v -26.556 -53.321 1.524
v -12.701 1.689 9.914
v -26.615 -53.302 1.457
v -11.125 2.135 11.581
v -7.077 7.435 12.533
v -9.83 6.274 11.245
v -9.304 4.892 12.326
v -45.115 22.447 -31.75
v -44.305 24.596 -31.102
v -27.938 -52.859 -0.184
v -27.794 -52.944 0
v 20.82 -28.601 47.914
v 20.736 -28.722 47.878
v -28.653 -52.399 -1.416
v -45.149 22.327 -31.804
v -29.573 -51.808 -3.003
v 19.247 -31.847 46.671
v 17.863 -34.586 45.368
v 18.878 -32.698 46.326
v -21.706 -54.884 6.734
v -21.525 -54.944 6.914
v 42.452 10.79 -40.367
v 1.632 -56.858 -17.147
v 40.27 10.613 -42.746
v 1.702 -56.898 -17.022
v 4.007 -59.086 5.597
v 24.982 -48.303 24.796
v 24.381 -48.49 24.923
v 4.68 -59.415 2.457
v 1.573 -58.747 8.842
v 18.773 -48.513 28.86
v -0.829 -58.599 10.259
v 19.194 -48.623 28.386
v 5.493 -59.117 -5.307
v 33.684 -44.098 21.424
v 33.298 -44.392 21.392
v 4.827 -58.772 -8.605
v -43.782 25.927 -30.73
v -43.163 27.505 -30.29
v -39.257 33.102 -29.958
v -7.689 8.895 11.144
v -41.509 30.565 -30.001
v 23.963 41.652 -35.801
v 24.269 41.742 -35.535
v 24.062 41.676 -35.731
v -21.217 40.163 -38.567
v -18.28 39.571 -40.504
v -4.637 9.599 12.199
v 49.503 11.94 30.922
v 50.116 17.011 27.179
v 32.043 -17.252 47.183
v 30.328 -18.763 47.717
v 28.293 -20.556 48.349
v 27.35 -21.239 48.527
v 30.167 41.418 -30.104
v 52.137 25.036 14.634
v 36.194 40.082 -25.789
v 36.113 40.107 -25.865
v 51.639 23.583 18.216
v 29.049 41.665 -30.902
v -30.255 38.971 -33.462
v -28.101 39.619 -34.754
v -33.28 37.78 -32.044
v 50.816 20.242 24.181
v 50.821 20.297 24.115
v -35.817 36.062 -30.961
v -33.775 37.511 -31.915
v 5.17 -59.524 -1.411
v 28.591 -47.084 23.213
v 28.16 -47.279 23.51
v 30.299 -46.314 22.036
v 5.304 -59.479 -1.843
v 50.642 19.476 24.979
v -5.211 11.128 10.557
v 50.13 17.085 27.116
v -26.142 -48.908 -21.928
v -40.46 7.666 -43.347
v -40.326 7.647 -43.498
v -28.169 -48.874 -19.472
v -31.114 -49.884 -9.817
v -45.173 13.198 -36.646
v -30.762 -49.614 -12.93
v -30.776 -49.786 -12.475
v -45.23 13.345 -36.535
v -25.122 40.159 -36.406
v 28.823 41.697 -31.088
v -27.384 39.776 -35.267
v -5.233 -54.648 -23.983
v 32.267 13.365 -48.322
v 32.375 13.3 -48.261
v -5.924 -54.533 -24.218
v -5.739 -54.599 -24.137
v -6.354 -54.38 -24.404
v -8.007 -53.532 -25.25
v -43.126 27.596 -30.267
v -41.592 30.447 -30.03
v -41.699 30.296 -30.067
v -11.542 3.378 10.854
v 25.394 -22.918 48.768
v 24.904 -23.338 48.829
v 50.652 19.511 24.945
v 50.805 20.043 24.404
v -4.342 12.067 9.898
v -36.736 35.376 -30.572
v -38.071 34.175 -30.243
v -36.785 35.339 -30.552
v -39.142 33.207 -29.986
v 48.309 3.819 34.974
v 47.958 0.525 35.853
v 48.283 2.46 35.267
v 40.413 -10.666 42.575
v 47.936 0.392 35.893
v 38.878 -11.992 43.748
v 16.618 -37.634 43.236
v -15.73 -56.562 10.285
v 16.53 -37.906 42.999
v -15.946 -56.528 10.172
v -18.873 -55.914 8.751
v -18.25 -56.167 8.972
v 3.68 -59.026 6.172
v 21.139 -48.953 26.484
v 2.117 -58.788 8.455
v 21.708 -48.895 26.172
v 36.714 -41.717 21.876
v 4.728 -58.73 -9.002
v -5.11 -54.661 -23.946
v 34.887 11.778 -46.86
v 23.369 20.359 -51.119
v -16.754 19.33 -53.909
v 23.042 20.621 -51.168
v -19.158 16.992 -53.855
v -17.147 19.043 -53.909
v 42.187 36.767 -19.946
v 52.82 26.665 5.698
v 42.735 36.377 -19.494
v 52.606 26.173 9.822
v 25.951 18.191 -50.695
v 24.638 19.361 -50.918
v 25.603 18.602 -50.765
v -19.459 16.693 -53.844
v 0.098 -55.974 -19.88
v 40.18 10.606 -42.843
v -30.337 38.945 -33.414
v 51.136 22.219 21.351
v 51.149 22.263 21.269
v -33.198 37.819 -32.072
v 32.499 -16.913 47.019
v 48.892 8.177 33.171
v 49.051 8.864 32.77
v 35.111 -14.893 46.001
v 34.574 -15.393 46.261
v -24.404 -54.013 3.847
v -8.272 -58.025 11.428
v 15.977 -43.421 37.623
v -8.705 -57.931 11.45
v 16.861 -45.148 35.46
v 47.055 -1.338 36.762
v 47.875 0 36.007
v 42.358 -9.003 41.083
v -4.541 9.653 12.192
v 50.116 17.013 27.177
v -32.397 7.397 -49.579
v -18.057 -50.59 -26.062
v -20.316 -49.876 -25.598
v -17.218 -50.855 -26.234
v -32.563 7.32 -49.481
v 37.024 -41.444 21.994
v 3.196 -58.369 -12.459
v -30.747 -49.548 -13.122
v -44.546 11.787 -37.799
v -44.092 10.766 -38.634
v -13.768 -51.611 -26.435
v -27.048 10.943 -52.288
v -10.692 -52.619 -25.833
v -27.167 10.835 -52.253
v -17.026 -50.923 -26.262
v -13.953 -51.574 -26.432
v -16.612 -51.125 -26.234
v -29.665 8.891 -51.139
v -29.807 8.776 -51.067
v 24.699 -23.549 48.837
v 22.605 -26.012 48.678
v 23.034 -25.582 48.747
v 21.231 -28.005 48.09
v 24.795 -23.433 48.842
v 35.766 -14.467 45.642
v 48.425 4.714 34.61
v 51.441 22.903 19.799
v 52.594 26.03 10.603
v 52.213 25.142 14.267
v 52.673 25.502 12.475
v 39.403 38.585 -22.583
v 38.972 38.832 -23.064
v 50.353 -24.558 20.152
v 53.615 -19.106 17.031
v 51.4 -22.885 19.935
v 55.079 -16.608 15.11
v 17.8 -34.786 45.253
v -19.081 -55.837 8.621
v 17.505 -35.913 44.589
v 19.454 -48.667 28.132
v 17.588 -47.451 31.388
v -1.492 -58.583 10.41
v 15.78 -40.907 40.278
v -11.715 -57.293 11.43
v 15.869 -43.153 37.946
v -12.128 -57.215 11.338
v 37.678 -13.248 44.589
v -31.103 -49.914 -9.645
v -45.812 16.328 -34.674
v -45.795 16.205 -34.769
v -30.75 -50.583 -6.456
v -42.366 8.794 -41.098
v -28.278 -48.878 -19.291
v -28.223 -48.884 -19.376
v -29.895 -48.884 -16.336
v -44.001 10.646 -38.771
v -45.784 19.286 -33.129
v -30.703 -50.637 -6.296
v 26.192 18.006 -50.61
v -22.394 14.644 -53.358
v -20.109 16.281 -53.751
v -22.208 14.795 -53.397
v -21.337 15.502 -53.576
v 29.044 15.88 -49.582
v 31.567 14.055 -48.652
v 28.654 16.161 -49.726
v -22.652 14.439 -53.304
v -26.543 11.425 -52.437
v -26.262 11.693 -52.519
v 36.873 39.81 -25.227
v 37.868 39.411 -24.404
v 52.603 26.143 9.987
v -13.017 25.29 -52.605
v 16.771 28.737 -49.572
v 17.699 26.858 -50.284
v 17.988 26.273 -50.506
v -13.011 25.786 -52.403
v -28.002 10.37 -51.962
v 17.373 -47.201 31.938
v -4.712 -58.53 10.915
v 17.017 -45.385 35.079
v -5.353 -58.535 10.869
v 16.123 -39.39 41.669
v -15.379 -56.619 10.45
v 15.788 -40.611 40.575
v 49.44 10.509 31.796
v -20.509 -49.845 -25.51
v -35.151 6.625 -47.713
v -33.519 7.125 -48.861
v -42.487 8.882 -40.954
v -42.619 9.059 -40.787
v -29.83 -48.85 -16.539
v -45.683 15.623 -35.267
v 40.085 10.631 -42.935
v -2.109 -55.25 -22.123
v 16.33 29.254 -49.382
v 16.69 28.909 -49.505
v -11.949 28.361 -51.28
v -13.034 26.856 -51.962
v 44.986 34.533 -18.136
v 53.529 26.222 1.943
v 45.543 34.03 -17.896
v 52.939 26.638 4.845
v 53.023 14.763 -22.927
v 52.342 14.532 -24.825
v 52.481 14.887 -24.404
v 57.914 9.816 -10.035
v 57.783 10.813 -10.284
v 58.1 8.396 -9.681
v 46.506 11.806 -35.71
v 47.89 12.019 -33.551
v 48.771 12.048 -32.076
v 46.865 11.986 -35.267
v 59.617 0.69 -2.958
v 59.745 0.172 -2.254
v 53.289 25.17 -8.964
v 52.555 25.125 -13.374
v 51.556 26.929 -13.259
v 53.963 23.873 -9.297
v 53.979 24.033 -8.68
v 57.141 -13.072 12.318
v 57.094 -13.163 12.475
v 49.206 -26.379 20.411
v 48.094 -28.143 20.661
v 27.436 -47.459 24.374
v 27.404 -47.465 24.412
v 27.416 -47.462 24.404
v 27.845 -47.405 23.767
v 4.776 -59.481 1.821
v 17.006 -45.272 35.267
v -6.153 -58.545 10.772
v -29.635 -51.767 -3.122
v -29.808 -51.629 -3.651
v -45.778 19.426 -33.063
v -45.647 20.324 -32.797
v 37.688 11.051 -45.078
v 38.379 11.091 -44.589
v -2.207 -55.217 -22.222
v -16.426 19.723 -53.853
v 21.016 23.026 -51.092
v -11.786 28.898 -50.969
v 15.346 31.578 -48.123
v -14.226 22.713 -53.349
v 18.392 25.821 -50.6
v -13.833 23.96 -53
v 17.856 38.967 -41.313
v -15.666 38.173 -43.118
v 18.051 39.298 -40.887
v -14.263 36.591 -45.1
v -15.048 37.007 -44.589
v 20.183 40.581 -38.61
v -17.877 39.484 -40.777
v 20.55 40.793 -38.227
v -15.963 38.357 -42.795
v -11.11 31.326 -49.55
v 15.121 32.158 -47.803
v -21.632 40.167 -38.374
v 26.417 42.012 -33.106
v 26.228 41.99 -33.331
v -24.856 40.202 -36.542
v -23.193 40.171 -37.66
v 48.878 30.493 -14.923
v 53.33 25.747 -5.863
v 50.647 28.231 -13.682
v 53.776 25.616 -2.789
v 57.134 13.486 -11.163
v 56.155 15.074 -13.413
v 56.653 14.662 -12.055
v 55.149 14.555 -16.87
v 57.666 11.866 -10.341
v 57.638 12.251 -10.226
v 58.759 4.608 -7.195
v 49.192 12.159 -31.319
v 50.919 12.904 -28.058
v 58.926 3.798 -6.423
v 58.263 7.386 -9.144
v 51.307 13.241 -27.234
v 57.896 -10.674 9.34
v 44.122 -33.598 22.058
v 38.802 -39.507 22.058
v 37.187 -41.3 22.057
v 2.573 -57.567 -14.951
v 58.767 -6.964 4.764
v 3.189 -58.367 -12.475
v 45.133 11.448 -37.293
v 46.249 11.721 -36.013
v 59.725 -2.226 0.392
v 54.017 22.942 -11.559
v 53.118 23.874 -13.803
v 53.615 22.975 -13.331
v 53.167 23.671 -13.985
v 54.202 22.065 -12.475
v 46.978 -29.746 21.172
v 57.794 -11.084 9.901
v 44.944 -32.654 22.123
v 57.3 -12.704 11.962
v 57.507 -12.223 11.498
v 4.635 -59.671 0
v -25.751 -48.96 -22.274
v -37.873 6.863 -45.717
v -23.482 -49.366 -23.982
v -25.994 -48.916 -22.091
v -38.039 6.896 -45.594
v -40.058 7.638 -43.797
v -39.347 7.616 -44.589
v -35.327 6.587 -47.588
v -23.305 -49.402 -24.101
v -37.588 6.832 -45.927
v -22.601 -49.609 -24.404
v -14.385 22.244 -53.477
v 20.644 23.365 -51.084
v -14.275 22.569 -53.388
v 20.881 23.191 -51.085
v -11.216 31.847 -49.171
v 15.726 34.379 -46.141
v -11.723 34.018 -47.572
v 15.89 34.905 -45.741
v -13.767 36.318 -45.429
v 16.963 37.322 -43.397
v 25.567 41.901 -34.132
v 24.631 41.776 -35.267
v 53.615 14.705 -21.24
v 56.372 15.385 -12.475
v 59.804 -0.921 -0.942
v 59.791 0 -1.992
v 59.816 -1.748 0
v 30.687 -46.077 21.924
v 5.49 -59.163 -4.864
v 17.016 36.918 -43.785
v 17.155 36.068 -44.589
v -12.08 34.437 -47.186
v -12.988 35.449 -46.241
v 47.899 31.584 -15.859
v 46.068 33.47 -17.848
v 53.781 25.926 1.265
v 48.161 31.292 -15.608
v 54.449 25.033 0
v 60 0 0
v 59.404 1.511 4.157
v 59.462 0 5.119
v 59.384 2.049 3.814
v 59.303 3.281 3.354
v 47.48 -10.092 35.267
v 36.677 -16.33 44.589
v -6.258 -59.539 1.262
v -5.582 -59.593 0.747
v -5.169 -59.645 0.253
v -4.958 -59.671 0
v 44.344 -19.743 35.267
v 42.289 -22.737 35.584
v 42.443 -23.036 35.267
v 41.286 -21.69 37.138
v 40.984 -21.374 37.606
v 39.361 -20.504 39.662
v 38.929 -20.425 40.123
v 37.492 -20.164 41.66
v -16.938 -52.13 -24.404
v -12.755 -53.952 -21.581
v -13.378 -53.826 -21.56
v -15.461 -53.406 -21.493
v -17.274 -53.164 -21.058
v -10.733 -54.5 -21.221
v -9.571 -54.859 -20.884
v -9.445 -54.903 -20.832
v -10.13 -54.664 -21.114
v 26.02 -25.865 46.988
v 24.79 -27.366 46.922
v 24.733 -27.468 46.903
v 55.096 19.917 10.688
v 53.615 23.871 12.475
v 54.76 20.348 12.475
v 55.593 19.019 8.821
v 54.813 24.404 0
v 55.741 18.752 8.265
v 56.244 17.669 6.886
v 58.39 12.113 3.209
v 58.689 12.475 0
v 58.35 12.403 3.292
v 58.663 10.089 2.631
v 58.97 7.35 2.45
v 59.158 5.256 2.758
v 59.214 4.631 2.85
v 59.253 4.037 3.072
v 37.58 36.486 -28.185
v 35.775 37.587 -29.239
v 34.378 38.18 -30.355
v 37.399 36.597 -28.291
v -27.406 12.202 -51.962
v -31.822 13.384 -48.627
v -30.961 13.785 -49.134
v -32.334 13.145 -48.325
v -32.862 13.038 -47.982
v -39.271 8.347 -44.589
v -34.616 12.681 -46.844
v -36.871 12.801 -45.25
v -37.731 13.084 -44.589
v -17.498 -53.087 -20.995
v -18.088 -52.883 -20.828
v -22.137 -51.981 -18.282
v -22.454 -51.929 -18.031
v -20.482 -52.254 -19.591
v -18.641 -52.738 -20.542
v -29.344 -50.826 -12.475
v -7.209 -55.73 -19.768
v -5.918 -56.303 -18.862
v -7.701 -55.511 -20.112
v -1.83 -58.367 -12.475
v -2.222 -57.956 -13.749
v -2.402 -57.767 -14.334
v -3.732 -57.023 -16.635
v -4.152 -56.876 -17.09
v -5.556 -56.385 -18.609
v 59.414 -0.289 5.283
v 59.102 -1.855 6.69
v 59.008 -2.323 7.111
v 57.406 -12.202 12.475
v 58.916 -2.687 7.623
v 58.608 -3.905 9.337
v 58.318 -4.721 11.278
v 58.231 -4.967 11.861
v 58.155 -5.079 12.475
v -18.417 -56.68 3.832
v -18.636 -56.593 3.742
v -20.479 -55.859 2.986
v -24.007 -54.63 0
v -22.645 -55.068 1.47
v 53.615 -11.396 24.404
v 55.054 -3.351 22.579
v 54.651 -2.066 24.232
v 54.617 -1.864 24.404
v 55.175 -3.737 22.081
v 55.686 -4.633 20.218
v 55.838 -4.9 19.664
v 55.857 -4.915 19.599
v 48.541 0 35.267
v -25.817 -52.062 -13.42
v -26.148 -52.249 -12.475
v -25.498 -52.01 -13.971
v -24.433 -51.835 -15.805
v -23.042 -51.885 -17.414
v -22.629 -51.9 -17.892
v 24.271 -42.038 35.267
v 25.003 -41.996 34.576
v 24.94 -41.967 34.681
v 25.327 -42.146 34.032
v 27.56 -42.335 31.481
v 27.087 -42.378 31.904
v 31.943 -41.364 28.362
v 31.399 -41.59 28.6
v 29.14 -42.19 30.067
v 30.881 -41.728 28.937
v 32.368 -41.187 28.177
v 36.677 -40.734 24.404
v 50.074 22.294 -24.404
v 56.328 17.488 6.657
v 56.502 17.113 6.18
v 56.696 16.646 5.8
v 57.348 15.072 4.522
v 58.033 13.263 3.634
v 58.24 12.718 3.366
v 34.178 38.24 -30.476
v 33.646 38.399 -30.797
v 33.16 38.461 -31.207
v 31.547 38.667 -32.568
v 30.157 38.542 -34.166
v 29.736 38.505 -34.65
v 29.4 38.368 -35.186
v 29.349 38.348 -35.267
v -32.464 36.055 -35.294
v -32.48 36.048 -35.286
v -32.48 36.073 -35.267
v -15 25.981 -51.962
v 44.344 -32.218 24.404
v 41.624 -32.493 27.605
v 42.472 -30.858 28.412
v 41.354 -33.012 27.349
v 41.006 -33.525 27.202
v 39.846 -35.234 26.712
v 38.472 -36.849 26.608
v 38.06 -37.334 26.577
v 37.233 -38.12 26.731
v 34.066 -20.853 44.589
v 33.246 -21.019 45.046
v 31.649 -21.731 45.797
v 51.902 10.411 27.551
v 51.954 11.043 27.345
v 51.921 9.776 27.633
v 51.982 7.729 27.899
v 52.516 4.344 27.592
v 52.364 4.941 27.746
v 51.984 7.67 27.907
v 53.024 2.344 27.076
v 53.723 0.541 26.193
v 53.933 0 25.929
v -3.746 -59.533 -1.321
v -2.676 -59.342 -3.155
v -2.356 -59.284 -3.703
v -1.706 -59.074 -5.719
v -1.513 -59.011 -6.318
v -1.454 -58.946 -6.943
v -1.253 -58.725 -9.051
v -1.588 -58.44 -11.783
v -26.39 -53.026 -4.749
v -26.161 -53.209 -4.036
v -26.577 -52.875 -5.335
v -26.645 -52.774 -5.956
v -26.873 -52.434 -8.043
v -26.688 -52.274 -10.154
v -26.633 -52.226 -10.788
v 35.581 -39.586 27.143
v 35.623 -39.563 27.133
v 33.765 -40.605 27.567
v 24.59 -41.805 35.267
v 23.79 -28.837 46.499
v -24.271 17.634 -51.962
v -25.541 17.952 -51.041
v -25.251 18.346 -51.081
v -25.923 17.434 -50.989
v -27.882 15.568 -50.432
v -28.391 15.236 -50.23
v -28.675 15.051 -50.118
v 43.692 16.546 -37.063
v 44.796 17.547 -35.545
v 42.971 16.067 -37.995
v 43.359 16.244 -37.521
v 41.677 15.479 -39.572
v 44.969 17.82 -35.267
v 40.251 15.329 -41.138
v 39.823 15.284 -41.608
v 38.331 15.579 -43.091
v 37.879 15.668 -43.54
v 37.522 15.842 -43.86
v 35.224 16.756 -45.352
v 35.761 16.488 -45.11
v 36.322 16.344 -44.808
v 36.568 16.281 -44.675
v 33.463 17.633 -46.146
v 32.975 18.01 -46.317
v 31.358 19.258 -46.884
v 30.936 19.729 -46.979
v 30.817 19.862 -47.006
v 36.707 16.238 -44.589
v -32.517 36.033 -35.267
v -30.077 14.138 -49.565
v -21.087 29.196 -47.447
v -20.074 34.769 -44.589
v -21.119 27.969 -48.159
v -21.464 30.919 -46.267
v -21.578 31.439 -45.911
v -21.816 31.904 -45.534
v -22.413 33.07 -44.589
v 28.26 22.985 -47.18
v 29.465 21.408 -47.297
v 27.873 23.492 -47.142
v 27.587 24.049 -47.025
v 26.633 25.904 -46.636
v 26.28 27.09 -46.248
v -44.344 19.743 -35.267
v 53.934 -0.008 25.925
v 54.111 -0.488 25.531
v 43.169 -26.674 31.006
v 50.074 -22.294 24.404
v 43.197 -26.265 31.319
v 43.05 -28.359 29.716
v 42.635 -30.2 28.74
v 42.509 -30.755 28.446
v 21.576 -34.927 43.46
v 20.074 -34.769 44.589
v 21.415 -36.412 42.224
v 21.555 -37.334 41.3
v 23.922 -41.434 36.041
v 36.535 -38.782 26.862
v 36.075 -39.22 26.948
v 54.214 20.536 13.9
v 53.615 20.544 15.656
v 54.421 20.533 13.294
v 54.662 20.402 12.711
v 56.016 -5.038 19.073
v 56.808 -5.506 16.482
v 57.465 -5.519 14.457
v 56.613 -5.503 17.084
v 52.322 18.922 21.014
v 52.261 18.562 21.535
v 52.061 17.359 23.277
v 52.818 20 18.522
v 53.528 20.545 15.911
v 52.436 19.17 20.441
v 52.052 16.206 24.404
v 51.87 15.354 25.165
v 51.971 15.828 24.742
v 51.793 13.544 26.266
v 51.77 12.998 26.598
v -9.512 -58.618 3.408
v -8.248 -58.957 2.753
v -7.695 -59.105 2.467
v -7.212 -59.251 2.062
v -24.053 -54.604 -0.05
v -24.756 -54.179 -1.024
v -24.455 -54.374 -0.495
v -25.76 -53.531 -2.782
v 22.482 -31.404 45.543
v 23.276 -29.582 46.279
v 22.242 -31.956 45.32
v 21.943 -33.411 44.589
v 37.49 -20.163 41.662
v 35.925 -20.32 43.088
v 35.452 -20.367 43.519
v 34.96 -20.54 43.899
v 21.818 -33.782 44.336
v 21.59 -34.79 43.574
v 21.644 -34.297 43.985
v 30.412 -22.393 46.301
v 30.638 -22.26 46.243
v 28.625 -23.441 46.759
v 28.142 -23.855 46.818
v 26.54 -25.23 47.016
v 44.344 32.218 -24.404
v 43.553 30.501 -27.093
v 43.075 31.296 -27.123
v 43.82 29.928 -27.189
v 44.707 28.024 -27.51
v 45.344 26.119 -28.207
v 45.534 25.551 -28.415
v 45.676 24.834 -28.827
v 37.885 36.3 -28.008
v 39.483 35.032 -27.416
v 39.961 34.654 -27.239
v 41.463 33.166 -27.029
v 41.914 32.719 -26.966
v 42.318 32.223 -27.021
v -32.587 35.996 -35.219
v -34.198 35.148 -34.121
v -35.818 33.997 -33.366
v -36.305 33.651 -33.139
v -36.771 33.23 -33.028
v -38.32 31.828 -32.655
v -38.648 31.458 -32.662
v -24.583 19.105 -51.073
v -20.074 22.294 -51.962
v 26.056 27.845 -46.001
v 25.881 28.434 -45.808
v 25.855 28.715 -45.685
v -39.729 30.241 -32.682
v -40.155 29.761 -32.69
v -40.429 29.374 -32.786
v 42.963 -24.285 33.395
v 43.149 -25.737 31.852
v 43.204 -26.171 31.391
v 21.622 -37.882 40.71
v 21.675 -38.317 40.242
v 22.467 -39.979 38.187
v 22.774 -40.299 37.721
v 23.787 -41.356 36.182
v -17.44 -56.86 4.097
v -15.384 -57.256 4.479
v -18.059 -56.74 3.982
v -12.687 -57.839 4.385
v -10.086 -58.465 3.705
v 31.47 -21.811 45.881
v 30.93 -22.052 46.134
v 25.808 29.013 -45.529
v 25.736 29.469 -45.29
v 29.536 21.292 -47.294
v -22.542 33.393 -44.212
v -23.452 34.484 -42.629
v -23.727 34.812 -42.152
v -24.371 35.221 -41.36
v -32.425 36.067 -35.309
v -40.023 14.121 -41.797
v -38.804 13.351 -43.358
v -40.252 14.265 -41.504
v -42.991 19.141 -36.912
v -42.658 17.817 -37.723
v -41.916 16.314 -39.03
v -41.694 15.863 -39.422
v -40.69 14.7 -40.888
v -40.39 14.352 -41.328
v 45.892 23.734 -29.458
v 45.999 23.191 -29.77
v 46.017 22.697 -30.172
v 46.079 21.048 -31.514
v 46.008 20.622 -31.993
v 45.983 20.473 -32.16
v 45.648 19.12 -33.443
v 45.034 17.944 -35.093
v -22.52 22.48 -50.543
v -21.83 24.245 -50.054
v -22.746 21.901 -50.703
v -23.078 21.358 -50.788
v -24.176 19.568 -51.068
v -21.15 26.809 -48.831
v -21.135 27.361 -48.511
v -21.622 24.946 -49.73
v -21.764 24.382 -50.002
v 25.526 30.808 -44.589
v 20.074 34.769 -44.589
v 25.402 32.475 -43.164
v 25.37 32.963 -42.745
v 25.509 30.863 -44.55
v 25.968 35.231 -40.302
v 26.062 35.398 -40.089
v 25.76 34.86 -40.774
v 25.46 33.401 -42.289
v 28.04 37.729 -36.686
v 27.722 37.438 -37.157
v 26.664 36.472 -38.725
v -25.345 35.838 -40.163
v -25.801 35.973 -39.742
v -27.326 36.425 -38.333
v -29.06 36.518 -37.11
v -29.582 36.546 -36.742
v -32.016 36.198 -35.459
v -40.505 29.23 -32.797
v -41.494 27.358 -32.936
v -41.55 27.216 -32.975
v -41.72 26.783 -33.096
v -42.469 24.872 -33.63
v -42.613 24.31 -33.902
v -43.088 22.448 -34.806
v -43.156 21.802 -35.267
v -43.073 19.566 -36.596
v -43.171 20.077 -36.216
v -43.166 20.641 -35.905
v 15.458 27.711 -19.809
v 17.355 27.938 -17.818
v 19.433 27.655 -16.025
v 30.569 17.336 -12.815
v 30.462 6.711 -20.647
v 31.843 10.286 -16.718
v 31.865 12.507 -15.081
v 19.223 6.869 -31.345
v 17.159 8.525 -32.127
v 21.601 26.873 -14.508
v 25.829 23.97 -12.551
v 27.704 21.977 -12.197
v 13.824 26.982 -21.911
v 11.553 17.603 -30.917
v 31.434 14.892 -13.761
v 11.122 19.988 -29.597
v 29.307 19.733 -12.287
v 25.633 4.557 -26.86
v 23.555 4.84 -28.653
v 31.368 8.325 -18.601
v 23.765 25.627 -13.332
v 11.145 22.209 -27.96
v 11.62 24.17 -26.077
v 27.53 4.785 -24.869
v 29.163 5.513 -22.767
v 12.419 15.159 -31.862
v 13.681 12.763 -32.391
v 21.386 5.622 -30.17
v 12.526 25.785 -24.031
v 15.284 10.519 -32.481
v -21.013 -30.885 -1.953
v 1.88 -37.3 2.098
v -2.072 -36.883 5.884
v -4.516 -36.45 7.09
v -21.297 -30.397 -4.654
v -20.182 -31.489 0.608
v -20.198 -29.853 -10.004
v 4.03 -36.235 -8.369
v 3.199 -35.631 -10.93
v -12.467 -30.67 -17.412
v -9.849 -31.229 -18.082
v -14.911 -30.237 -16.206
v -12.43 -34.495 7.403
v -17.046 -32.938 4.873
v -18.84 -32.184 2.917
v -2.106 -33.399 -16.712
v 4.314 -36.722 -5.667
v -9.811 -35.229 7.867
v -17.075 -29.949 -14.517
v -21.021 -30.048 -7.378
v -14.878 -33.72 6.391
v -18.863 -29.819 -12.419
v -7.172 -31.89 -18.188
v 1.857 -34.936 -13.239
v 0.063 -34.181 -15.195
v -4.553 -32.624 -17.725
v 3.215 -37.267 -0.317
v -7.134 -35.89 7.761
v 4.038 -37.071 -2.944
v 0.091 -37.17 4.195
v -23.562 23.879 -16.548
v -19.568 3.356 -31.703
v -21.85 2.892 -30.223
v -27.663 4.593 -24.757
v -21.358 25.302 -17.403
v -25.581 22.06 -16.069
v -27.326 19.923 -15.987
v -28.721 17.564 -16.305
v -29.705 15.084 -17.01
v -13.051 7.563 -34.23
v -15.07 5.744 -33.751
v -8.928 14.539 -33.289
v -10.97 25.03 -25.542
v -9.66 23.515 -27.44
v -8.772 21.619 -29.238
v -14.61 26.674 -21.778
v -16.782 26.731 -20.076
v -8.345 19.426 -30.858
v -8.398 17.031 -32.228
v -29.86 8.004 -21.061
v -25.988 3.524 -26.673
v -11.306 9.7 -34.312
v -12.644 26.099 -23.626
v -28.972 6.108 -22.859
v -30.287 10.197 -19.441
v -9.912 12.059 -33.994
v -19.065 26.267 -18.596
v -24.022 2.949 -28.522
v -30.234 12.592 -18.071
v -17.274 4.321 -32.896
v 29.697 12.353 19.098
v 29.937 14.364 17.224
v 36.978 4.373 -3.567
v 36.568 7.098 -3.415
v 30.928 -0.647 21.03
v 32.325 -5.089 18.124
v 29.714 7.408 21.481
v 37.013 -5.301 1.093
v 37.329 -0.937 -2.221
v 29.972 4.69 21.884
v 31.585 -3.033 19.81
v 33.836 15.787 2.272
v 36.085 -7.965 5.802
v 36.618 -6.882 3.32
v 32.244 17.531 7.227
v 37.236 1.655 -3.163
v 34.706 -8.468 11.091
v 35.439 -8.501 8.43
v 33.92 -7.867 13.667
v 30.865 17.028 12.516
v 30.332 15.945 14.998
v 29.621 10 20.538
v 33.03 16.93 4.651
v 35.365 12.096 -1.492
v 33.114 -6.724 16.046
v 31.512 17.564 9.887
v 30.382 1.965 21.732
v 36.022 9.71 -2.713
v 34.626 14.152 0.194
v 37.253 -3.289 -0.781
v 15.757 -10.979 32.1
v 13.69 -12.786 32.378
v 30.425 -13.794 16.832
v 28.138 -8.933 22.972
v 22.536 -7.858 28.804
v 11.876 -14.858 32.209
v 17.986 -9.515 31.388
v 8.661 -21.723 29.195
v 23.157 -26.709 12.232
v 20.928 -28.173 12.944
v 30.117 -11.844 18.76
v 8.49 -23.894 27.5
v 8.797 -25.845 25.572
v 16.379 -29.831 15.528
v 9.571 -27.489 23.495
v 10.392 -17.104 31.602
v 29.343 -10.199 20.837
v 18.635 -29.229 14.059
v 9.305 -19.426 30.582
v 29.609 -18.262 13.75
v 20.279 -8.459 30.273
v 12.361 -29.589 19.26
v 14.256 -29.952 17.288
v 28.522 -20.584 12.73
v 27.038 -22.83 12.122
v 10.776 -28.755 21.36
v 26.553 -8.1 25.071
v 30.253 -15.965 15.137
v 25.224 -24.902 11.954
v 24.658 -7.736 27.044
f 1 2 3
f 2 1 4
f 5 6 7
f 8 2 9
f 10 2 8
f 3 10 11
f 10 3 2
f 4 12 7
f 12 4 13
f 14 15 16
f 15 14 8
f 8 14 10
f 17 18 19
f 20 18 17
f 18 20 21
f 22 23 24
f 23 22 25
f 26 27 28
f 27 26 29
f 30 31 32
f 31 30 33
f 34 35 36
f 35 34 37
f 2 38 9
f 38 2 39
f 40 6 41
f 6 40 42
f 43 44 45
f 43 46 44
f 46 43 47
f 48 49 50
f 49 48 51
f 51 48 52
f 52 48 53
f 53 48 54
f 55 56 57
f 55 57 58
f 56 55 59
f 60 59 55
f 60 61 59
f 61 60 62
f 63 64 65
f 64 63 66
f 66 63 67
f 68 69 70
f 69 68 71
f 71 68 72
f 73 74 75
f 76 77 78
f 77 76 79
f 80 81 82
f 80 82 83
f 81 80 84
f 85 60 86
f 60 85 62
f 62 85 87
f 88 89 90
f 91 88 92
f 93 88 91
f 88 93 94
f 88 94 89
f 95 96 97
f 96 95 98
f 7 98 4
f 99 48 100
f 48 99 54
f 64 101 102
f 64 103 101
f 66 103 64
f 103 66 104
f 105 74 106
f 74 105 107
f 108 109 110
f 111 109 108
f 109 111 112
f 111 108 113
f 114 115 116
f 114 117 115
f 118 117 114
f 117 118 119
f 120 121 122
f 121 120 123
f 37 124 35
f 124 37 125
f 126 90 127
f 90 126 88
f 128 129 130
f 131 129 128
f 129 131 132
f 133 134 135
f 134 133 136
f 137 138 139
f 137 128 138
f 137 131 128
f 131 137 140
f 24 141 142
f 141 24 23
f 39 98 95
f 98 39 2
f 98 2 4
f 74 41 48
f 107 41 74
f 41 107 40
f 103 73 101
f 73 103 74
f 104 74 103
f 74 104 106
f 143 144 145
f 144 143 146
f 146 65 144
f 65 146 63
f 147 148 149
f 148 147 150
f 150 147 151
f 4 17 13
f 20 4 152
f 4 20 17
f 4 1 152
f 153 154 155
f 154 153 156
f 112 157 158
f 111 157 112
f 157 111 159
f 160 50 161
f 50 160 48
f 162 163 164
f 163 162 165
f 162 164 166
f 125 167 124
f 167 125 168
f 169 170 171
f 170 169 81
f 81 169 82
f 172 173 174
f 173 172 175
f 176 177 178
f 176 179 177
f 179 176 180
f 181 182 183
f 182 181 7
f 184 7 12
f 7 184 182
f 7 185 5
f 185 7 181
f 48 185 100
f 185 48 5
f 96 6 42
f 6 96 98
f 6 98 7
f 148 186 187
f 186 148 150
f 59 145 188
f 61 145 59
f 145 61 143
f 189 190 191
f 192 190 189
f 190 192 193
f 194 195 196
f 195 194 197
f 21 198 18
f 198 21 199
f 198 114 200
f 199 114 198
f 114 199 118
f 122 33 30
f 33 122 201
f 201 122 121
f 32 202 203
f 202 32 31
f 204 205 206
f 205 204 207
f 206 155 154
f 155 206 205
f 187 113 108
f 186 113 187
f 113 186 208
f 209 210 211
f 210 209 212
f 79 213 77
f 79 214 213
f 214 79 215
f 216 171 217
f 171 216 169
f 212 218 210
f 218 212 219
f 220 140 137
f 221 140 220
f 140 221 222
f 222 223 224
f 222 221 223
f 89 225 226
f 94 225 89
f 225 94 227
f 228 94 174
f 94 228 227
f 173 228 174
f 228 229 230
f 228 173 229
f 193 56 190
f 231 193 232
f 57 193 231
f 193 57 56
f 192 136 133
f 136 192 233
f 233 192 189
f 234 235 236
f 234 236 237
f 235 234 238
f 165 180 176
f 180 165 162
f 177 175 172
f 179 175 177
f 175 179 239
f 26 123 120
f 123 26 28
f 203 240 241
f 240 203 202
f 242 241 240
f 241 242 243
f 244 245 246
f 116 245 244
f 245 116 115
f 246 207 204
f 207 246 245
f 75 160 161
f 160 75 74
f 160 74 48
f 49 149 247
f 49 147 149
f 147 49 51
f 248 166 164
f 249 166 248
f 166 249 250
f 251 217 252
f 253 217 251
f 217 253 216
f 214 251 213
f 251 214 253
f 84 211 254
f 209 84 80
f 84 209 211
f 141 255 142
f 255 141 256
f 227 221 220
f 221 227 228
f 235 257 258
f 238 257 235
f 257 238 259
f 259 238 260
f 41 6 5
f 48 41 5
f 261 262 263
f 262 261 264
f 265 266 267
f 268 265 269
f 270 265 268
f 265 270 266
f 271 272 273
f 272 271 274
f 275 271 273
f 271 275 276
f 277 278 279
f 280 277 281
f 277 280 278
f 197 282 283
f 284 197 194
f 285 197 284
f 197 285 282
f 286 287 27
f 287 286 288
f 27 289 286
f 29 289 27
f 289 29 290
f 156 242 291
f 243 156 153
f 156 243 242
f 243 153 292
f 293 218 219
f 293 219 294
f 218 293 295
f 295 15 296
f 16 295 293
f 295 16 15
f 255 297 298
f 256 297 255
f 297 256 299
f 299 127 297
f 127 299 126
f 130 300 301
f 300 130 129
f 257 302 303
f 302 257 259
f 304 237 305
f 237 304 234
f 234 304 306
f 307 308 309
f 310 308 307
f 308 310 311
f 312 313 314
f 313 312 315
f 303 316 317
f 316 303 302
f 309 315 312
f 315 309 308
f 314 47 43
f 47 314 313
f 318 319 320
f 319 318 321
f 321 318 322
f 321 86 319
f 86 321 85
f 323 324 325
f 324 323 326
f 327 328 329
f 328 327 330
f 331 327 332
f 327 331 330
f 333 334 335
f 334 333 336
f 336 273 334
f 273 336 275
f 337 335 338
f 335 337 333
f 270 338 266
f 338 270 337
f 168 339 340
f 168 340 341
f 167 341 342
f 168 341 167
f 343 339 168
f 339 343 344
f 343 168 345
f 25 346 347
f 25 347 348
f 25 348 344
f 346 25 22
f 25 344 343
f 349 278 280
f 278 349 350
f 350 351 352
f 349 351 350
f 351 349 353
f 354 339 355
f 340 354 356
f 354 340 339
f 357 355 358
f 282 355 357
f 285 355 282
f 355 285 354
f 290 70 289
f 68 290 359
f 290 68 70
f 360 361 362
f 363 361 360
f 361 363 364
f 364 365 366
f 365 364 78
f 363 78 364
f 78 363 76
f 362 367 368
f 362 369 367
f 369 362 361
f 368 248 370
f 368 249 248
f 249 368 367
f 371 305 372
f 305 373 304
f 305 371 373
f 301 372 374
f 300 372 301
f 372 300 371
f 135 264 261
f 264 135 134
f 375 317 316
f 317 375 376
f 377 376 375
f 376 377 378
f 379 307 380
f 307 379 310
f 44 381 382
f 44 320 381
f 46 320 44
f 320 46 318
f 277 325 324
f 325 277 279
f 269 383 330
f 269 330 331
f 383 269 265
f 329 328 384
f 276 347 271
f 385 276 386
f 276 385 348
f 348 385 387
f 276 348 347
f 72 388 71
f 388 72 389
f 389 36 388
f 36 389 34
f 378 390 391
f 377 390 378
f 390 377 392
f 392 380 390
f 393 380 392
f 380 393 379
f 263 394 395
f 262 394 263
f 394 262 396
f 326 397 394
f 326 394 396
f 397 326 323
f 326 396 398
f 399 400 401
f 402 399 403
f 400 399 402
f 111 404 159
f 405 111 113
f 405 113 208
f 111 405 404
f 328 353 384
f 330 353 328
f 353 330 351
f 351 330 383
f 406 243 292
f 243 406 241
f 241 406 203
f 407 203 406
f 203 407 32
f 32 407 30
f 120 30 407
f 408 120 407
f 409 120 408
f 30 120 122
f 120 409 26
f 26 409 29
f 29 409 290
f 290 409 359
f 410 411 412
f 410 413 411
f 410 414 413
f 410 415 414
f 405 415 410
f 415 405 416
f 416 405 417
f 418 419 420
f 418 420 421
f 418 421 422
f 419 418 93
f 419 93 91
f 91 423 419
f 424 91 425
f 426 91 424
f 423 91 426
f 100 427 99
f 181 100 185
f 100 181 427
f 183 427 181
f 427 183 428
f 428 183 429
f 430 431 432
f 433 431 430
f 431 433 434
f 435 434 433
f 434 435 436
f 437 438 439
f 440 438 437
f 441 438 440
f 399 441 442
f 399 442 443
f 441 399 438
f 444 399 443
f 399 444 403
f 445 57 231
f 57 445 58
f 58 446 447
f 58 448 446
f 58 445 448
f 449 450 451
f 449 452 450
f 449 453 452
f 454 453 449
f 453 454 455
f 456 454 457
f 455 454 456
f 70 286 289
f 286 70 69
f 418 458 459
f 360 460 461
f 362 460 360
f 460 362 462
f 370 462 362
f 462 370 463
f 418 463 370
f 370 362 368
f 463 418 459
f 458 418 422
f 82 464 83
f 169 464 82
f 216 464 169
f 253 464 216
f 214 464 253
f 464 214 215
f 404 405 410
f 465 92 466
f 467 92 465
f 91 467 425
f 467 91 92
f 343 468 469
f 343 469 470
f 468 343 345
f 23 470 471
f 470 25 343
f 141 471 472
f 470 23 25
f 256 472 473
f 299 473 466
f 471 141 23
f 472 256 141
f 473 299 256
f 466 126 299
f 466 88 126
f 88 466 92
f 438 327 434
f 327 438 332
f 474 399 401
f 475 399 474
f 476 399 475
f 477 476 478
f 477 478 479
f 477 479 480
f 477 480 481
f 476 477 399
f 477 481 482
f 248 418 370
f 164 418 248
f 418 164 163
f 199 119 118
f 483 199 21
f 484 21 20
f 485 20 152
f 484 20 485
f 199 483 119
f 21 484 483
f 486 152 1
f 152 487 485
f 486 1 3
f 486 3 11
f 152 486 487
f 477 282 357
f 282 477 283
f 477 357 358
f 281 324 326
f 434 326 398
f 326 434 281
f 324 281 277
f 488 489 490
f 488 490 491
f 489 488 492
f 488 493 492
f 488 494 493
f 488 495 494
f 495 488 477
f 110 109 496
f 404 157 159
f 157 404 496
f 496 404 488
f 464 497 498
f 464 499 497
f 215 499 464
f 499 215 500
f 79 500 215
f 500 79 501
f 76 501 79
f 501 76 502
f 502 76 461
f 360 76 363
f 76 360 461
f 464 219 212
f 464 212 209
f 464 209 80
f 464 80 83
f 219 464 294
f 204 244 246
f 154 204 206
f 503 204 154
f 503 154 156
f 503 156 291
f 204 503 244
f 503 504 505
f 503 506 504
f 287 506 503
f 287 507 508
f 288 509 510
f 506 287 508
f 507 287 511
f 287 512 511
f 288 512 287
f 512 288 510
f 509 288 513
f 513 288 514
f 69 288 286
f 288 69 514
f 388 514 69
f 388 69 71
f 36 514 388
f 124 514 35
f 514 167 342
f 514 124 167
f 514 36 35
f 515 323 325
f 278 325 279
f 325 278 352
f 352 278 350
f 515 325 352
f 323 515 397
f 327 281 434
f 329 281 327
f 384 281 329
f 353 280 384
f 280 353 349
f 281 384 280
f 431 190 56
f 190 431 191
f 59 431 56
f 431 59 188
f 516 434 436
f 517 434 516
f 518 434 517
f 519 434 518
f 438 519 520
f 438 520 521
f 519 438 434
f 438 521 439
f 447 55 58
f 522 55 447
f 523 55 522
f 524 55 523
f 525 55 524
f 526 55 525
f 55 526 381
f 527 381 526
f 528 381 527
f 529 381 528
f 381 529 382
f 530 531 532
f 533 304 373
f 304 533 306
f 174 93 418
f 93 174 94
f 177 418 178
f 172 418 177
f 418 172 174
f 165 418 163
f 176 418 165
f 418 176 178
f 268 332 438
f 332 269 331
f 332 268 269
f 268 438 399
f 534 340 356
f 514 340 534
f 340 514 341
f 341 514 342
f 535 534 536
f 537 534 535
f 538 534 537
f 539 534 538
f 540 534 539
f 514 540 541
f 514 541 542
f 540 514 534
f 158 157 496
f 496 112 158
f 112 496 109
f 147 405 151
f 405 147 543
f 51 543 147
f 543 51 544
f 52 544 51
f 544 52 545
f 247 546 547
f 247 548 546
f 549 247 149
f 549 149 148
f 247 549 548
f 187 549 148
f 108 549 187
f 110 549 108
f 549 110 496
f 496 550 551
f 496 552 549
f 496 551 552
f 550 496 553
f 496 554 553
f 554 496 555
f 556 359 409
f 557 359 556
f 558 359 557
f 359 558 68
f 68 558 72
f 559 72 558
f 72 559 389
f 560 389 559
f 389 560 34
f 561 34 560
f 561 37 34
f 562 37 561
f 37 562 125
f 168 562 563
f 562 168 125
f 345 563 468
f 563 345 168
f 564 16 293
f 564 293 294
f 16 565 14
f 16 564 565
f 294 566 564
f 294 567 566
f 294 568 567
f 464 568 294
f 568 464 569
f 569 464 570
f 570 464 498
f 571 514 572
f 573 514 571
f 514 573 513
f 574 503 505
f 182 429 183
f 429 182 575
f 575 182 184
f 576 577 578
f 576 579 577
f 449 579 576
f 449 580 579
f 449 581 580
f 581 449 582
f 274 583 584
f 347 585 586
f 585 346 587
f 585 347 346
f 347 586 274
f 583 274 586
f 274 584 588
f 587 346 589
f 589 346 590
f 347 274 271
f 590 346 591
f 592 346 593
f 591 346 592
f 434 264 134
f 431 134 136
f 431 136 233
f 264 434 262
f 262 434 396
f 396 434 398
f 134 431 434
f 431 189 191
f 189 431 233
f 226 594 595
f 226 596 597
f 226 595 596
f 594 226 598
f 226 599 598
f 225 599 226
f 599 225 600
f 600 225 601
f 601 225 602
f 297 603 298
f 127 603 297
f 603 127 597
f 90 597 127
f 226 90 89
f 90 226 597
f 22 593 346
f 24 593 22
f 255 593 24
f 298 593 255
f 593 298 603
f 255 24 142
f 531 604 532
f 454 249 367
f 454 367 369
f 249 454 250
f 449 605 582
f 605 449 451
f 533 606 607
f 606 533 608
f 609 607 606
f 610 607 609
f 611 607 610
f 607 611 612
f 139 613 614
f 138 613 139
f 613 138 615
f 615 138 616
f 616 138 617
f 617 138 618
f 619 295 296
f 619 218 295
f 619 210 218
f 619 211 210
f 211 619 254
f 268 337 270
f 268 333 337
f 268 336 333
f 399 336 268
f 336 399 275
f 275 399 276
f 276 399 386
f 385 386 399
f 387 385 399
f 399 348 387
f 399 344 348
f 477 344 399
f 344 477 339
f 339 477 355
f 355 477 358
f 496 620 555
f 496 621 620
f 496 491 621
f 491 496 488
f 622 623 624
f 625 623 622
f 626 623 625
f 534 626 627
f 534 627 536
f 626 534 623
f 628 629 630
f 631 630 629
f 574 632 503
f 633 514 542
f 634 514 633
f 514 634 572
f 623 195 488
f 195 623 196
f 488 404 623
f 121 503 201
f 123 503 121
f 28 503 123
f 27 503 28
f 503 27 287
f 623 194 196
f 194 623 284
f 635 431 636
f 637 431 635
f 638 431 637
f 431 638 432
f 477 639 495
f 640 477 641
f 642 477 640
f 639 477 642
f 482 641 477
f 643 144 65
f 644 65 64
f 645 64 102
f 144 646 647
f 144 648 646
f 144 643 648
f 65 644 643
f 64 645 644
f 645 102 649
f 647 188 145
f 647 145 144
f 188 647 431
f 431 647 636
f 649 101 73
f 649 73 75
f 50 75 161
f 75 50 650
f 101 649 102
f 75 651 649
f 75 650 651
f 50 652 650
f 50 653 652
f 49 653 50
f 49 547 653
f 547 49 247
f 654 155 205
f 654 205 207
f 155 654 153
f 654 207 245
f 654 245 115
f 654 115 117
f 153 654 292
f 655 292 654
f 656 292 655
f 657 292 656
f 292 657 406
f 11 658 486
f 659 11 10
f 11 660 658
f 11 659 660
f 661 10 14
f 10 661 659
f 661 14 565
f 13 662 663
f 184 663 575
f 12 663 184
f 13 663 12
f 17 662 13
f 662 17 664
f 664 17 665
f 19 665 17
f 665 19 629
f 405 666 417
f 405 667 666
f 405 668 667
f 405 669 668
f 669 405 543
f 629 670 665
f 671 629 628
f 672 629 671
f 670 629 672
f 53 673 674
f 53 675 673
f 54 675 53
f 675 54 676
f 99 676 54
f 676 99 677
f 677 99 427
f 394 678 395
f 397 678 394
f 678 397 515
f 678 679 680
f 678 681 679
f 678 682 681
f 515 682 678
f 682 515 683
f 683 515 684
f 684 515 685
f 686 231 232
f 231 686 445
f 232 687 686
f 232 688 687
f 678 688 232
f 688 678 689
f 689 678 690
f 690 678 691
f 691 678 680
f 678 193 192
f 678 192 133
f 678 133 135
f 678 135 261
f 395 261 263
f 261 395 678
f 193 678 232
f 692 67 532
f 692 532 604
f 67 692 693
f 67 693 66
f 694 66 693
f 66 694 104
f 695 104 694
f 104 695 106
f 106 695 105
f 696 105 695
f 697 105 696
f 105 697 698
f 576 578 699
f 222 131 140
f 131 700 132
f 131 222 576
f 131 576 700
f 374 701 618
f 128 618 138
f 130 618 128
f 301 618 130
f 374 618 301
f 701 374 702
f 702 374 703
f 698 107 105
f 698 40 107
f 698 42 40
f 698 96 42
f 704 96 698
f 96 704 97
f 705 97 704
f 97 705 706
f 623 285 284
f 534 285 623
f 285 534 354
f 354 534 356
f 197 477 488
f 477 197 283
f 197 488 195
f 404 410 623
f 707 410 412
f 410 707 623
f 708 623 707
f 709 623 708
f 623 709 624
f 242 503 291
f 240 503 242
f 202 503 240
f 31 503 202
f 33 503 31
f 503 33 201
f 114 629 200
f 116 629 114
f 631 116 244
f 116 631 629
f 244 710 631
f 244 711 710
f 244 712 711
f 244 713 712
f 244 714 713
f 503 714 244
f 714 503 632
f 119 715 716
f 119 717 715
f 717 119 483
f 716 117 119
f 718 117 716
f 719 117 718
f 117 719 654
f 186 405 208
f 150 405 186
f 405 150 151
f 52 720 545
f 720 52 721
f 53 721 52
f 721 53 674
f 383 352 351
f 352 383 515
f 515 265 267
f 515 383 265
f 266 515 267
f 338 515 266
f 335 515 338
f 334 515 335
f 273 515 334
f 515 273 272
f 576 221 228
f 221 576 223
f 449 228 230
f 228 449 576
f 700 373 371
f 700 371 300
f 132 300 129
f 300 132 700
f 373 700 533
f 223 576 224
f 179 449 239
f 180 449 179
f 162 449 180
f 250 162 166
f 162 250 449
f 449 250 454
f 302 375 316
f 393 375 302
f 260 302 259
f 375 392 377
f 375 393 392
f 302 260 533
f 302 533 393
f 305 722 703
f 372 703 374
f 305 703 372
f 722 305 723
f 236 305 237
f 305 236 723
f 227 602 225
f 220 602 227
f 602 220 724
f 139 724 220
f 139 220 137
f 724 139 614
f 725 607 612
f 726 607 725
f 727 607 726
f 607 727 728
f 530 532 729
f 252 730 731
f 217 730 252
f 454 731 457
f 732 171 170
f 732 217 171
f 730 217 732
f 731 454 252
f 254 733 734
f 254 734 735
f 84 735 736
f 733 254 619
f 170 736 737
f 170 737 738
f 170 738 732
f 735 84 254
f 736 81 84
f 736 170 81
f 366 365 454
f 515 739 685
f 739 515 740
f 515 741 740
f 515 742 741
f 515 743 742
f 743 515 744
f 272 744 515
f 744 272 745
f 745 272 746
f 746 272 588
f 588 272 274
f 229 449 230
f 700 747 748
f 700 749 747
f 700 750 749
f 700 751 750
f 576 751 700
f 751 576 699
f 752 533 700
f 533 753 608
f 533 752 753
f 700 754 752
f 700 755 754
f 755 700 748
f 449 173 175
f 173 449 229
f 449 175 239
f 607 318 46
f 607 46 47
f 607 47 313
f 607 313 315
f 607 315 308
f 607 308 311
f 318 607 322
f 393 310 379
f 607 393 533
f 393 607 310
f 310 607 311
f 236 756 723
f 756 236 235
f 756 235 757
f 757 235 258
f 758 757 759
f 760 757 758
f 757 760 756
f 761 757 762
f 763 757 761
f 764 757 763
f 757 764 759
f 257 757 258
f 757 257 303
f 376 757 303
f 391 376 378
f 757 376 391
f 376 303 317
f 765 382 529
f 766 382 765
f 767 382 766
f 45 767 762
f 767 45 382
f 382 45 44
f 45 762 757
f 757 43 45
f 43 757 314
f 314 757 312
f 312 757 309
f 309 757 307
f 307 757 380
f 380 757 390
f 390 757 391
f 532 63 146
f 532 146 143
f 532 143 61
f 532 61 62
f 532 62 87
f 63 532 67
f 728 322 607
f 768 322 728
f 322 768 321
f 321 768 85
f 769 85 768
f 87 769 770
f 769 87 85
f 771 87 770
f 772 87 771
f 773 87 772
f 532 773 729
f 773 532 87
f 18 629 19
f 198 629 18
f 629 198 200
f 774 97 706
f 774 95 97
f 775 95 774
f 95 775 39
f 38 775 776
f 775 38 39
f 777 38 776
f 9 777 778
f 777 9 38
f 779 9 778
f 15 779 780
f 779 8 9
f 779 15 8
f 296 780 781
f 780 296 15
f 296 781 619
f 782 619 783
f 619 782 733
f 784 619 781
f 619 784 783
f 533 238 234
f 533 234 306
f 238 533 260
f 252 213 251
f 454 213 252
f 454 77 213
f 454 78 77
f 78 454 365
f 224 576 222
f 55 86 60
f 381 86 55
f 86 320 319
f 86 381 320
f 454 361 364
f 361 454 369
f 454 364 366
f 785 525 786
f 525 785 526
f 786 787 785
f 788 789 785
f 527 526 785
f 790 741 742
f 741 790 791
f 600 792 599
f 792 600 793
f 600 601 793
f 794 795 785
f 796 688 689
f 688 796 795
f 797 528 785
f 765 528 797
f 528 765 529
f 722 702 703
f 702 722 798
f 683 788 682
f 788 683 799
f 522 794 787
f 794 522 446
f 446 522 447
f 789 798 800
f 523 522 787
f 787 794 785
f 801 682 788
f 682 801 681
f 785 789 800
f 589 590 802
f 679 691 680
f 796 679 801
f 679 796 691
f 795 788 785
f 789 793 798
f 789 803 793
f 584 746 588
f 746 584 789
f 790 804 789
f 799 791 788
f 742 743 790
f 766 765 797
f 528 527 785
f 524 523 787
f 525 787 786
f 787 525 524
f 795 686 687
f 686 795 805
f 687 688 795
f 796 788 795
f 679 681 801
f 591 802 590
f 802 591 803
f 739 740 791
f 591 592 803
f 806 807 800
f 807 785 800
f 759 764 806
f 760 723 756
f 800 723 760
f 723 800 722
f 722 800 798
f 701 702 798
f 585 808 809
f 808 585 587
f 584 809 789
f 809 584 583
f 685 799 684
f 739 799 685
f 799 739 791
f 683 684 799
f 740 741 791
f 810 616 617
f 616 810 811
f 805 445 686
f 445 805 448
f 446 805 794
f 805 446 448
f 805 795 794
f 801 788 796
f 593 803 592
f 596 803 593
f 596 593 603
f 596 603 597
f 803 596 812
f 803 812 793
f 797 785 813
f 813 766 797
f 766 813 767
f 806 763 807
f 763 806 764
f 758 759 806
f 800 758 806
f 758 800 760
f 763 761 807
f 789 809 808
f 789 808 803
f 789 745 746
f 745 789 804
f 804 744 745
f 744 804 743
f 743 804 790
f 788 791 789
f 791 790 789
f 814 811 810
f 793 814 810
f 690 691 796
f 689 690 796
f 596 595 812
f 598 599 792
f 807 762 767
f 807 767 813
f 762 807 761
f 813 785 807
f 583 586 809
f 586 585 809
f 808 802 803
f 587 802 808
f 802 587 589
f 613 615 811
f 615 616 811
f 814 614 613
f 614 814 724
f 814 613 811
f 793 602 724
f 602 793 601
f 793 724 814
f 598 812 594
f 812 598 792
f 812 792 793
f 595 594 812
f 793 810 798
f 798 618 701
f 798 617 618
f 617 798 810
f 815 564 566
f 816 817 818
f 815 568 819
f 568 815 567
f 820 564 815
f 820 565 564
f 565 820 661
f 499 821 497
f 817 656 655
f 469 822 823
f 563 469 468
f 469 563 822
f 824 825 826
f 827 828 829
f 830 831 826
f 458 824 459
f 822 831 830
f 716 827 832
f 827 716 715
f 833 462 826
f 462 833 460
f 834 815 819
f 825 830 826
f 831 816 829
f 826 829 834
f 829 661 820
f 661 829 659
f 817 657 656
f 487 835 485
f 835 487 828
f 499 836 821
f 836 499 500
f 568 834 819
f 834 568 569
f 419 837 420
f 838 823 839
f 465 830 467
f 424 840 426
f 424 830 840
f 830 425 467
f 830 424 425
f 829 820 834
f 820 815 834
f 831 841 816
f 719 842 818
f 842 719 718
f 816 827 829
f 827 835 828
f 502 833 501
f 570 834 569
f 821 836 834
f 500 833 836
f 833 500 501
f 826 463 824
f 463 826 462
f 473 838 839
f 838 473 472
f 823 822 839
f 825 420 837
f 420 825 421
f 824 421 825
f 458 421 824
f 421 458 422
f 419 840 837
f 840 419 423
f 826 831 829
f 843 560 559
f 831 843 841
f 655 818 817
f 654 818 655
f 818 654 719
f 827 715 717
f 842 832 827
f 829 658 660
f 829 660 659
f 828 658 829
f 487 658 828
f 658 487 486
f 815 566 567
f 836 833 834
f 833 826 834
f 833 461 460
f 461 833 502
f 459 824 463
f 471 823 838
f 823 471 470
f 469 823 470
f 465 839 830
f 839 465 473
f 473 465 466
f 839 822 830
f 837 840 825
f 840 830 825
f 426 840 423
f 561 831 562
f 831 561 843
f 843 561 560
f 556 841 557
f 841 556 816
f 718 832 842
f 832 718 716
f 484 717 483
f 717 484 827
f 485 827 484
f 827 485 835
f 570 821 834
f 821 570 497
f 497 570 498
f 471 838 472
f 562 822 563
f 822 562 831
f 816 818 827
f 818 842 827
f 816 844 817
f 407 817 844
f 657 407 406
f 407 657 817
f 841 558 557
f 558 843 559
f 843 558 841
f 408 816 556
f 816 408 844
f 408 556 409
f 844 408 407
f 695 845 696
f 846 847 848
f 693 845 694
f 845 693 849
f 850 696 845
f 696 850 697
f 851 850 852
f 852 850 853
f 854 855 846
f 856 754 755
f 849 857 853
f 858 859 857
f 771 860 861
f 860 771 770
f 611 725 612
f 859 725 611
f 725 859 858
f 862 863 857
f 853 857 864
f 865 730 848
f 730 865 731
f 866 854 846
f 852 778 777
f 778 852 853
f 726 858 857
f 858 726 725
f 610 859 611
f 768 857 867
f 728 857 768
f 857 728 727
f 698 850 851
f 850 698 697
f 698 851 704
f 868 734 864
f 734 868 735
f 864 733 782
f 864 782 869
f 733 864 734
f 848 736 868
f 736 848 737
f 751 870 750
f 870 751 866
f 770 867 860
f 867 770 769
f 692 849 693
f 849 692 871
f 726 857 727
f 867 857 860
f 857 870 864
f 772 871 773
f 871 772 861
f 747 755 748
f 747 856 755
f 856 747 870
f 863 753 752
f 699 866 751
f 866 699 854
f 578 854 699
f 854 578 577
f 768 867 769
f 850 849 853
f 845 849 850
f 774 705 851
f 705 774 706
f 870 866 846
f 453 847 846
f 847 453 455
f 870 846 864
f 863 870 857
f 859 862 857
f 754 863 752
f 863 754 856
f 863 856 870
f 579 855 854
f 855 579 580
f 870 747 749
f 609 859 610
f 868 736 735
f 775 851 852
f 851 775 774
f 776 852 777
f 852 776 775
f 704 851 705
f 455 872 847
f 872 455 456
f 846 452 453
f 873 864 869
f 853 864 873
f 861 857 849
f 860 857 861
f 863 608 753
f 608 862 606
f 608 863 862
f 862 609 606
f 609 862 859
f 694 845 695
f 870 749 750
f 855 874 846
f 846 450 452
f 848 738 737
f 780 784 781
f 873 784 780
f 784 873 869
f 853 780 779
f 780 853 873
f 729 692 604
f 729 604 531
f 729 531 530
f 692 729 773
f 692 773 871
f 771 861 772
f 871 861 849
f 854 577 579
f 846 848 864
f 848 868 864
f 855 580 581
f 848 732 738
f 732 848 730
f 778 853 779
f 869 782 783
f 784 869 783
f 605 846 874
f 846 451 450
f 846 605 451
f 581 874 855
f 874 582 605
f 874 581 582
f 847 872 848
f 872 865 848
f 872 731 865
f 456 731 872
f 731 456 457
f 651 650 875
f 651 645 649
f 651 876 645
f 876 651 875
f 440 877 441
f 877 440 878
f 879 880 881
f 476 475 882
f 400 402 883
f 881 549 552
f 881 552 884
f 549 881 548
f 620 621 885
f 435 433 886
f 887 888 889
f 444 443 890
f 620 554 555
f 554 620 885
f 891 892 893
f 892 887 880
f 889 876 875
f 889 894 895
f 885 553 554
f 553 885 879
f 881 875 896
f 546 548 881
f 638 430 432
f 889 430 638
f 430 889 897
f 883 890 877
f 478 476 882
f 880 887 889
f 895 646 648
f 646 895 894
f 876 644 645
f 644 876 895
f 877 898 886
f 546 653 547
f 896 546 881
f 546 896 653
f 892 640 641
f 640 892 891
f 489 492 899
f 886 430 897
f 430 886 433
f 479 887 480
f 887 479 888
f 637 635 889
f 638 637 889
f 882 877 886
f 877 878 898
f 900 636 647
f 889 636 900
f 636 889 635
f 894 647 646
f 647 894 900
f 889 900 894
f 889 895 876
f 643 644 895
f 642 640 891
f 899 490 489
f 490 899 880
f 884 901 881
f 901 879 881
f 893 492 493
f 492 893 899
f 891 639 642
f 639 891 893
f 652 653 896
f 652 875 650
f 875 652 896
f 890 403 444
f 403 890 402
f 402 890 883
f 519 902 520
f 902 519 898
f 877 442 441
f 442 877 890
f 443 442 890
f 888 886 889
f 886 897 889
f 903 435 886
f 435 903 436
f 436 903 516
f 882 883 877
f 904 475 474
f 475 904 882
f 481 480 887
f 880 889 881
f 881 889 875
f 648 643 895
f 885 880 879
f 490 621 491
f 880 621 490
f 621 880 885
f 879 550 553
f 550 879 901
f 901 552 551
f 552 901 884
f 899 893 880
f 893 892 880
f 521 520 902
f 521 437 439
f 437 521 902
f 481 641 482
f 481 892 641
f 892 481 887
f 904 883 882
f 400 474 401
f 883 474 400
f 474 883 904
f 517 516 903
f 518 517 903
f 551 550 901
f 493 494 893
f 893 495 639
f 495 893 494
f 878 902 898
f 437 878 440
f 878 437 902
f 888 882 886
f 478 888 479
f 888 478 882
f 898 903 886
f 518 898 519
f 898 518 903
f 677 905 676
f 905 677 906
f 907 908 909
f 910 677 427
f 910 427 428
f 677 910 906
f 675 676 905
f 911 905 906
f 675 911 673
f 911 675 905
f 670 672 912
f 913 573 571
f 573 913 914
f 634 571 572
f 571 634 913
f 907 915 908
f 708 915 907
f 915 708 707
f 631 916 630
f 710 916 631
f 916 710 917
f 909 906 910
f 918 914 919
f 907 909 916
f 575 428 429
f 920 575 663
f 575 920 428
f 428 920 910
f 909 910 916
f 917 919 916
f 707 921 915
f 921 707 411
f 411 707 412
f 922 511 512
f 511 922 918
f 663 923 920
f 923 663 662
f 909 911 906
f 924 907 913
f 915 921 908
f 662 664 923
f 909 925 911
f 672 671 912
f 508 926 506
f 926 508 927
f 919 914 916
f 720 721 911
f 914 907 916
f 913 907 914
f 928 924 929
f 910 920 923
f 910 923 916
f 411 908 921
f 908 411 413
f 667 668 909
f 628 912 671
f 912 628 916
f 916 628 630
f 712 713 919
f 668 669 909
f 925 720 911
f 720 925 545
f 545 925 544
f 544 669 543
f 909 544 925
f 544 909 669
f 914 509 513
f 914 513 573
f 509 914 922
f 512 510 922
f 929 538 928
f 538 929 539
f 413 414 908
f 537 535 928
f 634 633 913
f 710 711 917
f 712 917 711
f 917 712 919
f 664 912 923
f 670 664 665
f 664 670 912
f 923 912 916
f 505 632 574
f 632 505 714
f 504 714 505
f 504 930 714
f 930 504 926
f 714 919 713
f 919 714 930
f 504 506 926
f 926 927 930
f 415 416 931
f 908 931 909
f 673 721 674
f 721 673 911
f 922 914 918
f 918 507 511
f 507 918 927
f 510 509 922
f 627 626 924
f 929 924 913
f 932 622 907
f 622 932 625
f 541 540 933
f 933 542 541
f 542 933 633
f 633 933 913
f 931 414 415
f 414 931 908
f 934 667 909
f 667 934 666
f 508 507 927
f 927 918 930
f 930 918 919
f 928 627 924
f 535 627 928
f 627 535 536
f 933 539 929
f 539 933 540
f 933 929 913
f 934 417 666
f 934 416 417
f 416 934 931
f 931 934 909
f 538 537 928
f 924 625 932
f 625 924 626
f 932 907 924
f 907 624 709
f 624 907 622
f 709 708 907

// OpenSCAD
difference() {
	intersection() {
		hull() {
			rotate(a = -123.3588517168, v = [0.2833660352, 0.7857063954, -0.0000000000]) {
				rotate(a = -90.0000000000, v = [0.8660254038, 0.5000000000, -0.0000000000]) {
					cylinder(h = 60, r = 16.2000000000);
				}
			}
			rotate(a = -123.3588517168, v = [0.2833660352, 0.7857063954, -0.0000000000]) {
				rotate(a = -90.0000000000, v = [-0.8660254038, 0.5000000000, 0.0000000000]) {
					cylinder(h = 60, r = 16.2000000000);
				}
			}
			rotate(a = -123.3588517168, v = [0.2833660352, 0.7857063954, -0.0000000000]) {
				rotate(a = -18.4383929552, v = [0.2783292144, 0.1502295517, -0.0000000000]) {
					cylinder(h = 60, r = 16.2000000000);
				}
			}
			rotate(a = -123.3588517168, v = [0.2833660352, 0.7857063954, -0.0000000000]) {
				rotate(a = -149.1684967374, v = [0.5053058454, 0.0856603985, -0.0000000000]) {
					cylinder(h = 60, r = 16.2000000000);
				}
			}
			rotate(a = -123.3588517168, v = [0.2833660352, 0.7857063954, -0.0000000000]) {
				rotate(a = -159.6517266695, v = [-0.3468424841, -0.0247683702, 0.0000000000]) {
					cylinder(h = 60, r = 16.2000000000);
				}
			}
		}
		sphere(r = 60);
	}
	union() {
		rotate(a = -123.3588517168, v = [0.2833660352, 0.7857063954, -0.0000000000]) {
			rotate(a = -90.0000000000, v = [0.8660254038, 0.5000000000, -0.0000000000]) {
				translate(v = [0, 0, 35]) {
					cylinder(h = 100, r = 13.2000000000);
				}
			}
		}
		rotate(a = -123.3588517168, v = [0.2833660352, 0.7857063954, -0.0000000000]) {
			rotate(a = -90.0000000000, v = [-0.8660254038, 0.5000000000, 0.0000000000]) {
				translate(v = [0, 0, 35]) {
					cylinder(h = 100, r = 13.2000000000);
				}
			}
		}
		rotate(a = -123.3588517168, v = [0.2833660352, 0.7857063954, -0.0000000000]) {
			rotate(a = -18.4383929552, v = [0.2783292144, 0.1502295517, -0.0000000000]) {
				translate(v = [0, 0, 35]) {
					cylinder(h = 100, r = 13.2000000000);
				}
			}
		}
		rotate(a = -123.3588517168, v = [0.2833660352, 0.7857063954, -0.0000000000]) {
			rotate(a = -149.1684967374, v = [0.5053058454, 0.0856603985, -0.0000000000]) {
				translate(v = [0, 0, 35]) {
					cylinder(h = 100, r = 13.2000000000);
				}
			}
		}
		rotate(a = -123.3588517168, v = [0.2833660352, 0.7857063954, -0.0000000000]) {
			rotate(a = -159.6517266695, v = [-0.3468424841, -0.0247683702, 0.0000000000]) {
				translate(v = [0, 0, 35]) {
					cylinder(h = 100, r = 13.2000000000);
				}
			}
		}
	}
}
